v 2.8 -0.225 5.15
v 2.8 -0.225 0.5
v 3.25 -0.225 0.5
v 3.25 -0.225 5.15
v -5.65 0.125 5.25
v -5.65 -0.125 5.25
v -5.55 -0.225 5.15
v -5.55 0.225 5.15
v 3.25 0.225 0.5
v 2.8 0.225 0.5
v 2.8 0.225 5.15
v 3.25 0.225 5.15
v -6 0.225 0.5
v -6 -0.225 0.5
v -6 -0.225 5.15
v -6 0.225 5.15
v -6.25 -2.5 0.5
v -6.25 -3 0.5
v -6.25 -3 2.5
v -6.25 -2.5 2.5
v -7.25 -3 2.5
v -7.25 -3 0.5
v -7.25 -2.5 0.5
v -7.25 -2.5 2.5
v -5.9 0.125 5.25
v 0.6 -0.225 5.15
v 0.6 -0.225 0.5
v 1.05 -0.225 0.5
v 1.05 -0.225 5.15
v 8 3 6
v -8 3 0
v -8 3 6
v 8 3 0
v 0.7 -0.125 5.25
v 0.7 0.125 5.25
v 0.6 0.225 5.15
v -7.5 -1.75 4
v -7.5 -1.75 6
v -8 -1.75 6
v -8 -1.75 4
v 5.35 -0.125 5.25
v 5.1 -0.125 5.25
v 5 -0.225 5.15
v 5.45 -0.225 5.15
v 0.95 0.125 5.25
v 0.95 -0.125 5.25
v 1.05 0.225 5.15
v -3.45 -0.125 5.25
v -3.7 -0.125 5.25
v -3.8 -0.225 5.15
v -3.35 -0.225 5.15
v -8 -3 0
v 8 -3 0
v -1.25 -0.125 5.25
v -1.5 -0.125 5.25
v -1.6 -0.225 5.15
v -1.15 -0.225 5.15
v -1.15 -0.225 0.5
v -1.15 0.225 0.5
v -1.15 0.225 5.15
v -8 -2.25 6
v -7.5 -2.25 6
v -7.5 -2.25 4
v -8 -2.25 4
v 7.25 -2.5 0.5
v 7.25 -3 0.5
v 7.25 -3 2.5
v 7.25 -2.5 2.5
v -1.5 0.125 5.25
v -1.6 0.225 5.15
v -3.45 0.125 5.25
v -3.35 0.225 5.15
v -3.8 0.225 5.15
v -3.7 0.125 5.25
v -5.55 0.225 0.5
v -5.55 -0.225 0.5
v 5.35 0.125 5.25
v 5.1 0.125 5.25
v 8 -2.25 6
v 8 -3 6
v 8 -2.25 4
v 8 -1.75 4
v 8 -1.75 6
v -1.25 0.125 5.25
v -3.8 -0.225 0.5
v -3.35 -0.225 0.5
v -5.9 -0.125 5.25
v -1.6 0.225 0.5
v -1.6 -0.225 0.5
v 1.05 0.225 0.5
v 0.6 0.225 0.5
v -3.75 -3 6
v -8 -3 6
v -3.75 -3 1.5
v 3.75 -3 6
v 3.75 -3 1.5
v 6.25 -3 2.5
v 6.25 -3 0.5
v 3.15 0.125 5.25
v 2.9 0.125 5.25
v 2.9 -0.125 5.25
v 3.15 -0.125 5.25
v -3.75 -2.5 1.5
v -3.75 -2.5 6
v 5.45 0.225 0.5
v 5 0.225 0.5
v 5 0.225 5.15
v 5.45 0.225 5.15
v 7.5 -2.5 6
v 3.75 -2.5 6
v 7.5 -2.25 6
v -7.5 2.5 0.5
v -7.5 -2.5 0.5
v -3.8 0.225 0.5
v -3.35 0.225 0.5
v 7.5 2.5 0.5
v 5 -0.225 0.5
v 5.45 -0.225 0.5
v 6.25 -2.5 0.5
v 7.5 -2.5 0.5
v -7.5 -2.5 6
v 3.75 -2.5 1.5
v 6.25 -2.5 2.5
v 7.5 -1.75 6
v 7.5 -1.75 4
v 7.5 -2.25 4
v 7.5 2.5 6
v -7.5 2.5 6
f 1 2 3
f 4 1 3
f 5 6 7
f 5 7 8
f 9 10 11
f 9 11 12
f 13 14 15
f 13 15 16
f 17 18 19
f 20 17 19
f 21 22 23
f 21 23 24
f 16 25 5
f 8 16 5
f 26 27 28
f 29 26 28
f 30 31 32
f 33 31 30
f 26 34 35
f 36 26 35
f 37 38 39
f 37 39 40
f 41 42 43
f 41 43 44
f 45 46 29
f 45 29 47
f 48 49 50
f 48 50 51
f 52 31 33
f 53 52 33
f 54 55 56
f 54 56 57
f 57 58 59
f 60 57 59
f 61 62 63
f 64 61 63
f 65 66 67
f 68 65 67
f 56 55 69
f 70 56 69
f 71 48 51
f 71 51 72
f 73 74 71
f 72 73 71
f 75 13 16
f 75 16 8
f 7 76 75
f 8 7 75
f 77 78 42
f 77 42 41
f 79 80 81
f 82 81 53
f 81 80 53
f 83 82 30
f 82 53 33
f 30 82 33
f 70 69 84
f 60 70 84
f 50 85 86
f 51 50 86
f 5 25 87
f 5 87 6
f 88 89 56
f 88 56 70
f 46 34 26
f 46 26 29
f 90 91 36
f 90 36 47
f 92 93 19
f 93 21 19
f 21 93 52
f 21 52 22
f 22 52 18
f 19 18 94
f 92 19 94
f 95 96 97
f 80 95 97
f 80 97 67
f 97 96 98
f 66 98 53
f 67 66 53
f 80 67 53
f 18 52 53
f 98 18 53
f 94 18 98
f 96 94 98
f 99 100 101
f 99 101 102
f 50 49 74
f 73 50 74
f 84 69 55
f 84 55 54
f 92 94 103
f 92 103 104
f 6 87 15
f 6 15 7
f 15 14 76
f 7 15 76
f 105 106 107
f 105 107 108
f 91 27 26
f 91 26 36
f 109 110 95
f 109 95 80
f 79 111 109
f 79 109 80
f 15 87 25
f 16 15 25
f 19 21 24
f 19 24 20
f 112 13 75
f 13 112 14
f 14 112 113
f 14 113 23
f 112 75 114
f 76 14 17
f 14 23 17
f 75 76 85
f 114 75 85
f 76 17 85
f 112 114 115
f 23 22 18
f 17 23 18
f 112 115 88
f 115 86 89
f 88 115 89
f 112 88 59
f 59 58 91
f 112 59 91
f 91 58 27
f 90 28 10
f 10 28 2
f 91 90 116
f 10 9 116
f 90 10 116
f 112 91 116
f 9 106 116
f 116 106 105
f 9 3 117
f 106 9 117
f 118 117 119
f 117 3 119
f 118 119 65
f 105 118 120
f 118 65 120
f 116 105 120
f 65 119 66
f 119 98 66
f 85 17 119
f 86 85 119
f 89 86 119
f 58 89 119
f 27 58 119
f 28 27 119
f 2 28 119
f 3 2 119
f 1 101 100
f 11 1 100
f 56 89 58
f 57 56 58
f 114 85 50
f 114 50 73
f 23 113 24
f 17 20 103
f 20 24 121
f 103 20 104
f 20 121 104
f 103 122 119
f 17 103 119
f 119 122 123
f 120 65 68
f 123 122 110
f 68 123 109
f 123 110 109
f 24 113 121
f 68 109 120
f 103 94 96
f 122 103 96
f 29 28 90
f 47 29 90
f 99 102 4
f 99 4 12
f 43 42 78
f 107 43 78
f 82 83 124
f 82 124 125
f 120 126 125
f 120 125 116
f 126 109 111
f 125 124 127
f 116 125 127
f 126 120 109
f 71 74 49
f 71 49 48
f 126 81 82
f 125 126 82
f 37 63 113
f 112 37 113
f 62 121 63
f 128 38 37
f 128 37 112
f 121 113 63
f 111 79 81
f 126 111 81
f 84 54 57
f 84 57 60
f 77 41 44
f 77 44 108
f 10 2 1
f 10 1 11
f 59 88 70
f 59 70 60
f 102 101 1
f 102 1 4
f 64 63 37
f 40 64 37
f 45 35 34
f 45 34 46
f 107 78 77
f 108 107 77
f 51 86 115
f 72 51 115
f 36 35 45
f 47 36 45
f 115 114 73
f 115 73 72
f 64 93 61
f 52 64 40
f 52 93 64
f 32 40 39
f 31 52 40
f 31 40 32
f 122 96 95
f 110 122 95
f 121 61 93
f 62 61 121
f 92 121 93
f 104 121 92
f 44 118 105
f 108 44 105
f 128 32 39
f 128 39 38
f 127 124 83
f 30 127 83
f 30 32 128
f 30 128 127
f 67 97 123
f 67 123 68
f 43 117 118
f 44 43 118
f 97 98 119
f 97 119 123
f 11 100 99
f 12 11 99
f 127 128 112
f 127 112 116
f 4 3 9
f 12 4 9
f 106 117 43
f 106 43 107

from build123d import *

# Parameters (mm, degrees)
SZKIC1_W                          = 16
SZKIC1_H                          = 6
DODANIE_WYCI_GNI_CIE1_DEPTH       = 6
SZKIC2_W                          = 15
SZKIC2_H                          = 5
WYTNIJ_WYCI_GNI_CIE1_DEPTH        = 5.5
SZKIC3_W                          = 2
SZKIC3_H                          = 0.5
WYTNIJ_WYCI_GNI_CIE2_DEPTH        = 18.349351573
WYTNIJ_WYCI_GNI_CIE3_REACH        = 13.662
SZKIC4_W                          = 7.5
SZKIC4_H                          = 4.5
WYTNIJ_WYCI_GNI_CIE4_REACH        = 13.662
SZKIC5_W                          = 1
SZKIC5_H                          = 2
SZKIC6_W                          = 0.45
SZKIC6_H                          = 0.45
DODANIE_WYCI_GNI_CIE2_DEPTH       = 4.75
SFAZOWANIE1_SIZE                  = 0.1
SZYK_LINIOWY1_COUNT               = 6
SZYK_LINIOWY1_PITCH               = 2.2
SFAZOWANIE1_OF_SZYK_LINIOWY1_SIZE = 0.1


with BuildPart() as part:
    # Szkic1 → Dodanie-wyciągnięcie1 (new body)
    with BuildSketch(Plane.XY):
        Rectangle(SZKIC1_W, SZKIC1_H)
    extrude(amount=DODANIE_WYCI_GNI_CIE1_DEPTH)

    # Szkic2 → Wytnij-wyciągnięcie1 (cut)
    with BuildSketch(Plane.XY.offset(6)):
        Rectangle(SZKIC2_W, SZKIC2_H)
    extrude(amount=-WYTNIJ_WYCI_GNI_CIE1_DEPTH, mode=Mode.SUBTRACT)

    # Szkic3 → Wytnij-wyciągnięcie2 (cut, through all)
    with BuildSketch(Plane(origin=(8, 0, 0), x_dir=(0, 0, -1), z_dir=(1, 0, 0))):
        with Locations((-5, -2)):
            Rectangle(SZKIC3_W, SZKIC3_H)
    extrude(amount=-WYTNIJ_WYCI_GNI_CIE2_DEPTH, mode=Mode.SUBTRACT)

    # Szkic4 → Wytnij-wyciągnięcie3 (cut, up to next)
    with BuildSketch(Plane.XZ.offset(3), mode=Mode.PRIVATE) as wytnij_wyci_gni_cie3_sk1:
        with Locations((0, 3.75)):
            Rectangle(SZKIC4_W, SZKIC4_H)
    wytnij_wyci_gni_cie3_tool1 = extrude(wytnij_wyci_gni_cie3_sk1.sketch, amount=-WYTNIJ_WYCI_GNI_CIE3_REACH, mode=Mode.PRIVATE) & part.part
    add(wytnij_wyci_gni_cie3_tool1.solids().sort_by_distance((0, -3, 3.75))[0], mode=Mode.SUBTRACT)

    # Szkic5 → Wytnij-wyciągnięcie4 (cut, up to next)
    with BuildSketch(Plane.XZ.offset(3), mode=Mode.PRIVATE) as wytnij_wyci_gni_cie4_sk1:
        with Locations((-6.75, 1.5)):
            Rectangle(SZKIC5_W, SZKIC5_H)
    wytnij_wyci_gni_cie4_tool1 = extrude(wytnij_wyci_gni_cie4_sk1.sketch, amount=-WYTNIJ_WYCI_GNI_CIE4_REACH, mode=Mode.PRIVATE) & part.part
    # Szkic5 → Wytnij-wyciągnięcie4 (cut, up to next)
    with BuildSketch(Plane.XZ.offset(3), mode=Mode.PRIVATE) as wytnij_wyci_gni_cie4_sk2:
        with Locations((6.75, 1.5)):
            Rectangle(SZKIC5_W, SZKIC5_H)
    wytnij_wyci_gni_cie4_tool2 = extrude(wytnij_wyci_gni_cie4_sk2.sketch, amount=-WYTNIJ_WYCI_GNI_CIE4_REACH, mode=Mode.PRIVATE) & part.part
    add(wytnij_wyci_gni_cie4_tool1.solids().sort_by_distance((-6.75, -3, 1.5))[0], mode=Mode.SUBTRACT)
    add(wytnij_wyci_gni_cie4_tool2.solids().sort_by_distance((6.75, -3, 1.5))[0], mode=Mode.SUBTRACT)

    # Szkic6 → Dodanie-wyciągnięcie2 (add)
    with BuildSketch(Plane.XY.offset(0.5)):
        with Locations((-5.775, 0)):
            Rectangle(SZKIC6_W, SZKIC6_H)
    dodanie_wyci_gni_cie2 = extrude(amount=DODANIE_WYCI_GNI_CIE2_DEPTH)

    # Sfazowanie1
    sfazowanie1_edges = [part.edges().sort_by_distance(p)[0] for p in [
        (-5.55, 0, 5.25),
        (-5.775, 0.225, 5.25),
        (-6, 0, 5.25),
        (-5.775, -0.225, 5.25),
    ]]
    chamfer(sfazowanie1_edges, length=SFAZOWANIE1_SIZE)

    # Szyk liniowy1: Dodanie-wyciągnięcie2 ×6
    with Locations(*[(i * SZYK_LINIOWY1_PITCH, 0, 0) for i in range(1, SZYK_LINIOWY1_COUNT)]):
        add(dodanie_wyci_gni_cie2)

    # Sfazowanie1 of Szyk liniowy1
    sfazowanie1_of_szyk_liniowy1_edges = [part.edges().sort_by_distance(p)[0] for p in [
        (-3.35, 0, 5.25),
        (-3.575, 0.225, 5.25),
        (-3.8, 0, 5.25),
        (-3.575, -0.225, 5.25),
        (-1.15, 0, 5.25),
        (-1.375, 0.225, 5.25),
        (-1.6, 0, 5.25),
        (-1.375, -0.225, 5.25),
        (1.05, 0, 5.25),
        (0.825, 0.225, 5.25),
        (0.6, 0, 5.25),
        (0.825, -0.225, 5.25),
        (3.25, 0, 5.25),
        (3.025, 0.225, 5.25),
        (2.8, 0, 5.25),
        (3.025, -0.225, 5.25),
        (5.45, 0, 5.25),
        (5.225, 0.225, 5.25),
        (5, 0, 5.25),
        (5.225, -0.225, 5.25),
    ]]
    chamfer(sfazowanie1_of_szyk_liniowy1_edges, length=SFAZOWANIE1_OF_SZYK_LINIOWY1_SIZE)


solid = part.part
